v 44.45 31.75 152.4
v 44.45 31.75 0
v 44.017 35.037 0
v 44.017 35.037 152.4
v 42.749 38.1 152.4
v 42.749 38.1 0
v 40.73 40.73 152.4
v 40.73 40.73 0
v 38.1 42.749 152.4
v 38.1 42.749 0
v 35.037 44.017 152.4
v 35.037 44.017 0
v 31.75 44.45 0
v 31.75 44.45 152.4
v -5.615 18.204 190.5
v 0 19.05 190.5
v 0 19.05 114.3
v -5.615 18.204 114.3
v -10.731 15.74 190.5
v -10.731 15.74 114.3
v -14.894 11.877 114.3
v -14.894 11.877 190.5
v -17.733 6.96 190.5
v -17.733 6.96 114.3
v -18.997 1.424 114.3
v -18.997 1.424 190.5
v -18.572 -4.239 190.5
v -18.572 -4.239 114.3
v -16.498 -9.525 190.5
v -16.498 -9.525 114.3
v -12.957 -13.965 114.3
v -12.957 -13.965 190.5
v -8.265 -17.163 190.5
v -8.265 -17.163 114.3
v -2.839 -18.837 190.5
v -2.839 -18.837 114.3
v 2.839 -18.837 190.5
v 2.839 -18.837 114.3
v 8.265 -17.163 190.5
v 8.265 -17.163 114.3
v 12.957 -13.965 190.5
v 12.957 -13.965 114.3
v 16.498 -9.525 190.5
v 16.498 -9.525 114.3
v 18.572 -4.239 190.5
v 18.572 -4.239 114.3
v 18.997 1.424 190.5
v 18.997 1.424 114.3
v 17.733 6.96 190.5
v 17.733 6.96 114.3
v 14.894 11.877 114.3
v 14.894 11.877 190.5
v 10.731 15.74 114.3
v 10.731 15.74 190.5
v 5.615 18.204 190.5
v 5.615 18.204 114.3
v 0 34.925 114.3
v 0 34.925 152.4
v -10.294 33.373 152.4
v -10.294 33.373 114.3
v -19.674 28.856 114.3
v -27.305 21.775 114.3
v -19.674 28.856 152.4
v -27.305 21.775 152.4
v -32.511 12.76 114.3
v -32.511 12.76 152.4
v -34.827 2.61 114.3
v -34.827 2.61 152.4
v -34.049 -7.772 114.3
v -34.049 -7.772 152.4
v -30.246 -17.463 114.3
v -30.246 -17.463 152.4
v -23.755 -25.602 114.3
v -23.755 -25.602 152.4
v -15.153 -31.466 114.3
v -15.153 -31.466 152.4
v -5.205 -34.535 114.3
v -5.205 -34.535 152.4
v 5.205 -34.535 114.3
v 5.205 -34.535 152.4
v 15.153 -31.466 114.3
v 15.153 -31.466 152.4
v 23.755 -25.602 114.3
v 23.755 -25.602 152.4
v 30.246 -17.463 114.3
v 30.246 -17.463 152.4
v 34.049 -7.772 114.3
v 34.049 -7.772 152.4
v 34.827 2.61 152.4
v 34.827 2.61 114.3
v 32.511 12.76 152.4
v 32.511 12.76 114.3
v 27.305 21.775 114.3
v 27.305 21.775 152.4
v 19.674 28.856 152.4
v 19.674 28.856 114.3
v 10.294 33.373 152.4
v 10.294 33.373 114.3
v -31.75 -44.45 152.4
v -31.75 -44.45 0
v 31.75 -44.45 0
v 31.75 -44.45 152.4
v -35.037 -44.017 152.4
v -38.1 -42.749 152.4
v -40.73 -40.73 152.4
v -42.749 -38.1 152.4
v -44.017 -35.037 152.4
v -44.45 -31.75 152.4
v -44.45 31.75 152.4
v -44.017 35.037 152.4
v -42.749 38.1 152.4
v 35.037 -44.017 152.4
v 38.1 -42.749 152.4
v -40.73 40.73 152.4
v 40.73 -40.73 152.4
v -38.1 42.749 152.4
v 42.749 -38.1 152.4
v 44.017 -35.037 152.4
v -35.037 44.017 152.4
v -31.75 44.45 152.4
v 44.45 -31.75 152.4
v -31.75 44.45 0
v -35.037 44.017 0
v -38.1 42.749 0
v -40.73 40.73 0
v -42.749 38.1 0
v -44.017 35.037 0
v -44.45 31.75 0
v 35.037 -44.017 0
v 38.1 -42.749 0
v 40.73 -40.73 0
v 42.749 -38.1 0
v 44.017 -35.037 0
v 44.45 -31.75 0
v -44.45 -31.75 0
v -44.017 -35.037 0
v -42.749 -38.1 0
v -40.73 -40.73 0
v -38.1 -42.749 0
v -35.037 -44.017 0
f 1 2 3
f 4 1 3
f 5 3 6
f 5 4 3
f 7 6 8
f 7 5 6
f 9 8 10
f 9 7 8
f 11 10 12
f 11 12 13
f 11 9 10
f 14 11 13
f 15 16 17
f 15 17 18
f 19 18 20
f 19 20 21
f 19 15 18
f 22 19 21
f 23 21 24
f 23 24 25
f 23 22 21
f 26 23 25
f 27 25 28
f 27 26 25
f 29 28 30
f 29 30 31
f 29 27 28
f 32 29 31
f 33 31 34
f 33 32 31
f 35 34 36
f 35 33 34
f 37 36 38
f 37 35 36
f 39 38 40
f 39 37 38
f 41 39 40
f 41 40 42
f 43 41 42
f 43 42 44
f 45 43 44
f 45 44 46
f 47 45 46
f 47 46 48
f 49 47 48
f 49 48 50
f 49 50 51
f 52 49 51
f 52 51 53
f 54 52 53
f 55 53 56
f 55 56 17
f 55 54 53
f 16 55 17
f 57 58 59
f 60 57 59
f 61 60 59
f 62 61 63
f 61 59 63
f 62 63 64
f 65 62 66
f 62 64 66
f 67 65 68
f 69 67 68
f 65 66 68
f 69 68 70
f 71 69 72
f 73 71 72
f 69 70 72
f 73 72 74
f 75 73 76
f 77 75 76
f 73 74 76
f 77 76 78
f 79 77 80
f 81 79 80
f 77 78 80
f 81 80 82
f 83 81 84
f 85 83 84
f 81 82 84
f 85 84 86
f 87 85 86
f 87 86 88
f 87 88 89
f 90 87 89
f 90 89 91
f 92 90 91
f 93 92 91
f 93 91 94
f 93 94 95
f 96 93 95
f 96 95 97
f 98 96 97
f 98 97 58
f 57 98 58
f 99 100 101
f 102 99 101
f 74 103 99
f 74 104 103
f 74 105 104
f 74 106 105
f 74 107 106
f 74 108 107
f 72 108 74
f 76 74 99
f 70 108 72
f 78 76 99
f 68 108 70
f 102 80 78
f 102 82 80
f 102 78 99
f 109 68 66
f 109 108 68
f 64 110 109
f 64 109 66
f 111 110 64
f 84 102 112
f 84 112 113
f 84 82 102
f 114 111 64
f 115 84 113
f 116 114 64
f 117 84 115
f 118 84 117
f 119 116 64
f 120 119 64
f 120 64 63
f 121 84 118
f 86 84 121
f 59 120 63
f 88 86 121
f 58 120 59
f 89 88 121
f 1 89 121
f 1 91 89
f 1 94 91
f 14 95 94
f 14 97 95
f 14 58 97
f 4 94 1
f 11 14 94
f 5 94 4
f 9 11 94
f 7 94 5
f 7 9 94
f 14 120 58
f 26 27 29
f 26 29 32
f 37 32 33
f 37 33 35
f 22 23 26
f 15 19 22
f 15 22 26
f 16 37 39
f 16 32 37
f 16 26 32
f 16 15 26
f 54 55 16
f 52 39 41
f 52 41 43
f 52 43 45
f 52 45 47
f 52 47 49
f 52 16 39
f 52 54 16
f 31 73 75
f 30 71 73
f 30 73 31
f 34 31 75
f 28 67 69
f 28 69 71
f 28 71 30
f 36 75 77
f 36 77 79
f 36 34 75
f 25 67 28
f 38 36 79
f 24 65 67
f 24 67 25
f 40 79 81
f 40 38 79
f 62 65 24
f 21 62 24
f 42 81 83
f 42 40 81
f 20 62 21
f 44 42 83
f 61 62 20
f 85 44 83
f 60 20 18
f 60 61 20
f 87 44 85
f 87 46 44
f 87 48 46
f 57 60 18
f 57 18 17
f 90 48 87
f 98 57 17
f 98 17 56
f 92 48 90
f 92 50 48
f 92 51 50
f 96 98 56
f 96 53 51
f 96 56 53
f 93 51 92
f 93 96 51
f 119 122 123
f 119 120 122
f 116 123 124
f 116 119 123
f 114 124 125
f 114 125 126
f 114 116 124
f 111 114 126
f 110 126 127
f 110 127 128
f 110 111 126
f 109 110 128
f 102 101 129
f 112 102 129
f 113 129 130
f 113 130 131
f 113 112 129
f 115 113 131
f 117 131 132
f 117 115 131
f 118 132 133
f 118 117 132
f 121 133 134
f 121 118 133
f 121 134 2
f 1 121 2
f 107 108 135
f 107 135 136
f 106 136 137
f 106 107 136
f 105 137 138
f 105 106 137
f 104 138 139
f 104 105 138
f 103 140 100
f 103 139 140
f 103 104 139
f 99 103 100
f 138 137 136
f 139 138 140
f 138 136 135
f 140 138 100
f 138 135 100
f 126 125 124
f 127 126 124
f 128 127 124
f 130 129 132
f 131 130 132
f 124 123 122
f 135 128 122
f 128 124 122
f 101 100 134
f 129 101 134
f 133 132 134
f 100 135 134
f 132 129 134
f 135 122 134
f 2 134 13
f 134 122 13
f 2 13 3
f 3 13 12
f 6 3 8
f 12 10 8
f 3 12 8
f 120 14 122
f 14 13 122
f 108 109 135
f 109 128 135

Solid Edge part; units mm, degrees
sketch "Sketch1" plane through (0, 0, 0) normal (0, 0, 1) x (1, 0, 0)
  line L0 (-44.45, -44.45) -> (44.45, -44.45)
  line L1 (44.45, -44.45) -> (44.45, 44.45)
  line L2 (44.45, 44.45) -> (-44.45, 44.45)
  line L3 (-44.45, 44.45) -> (-44.45, -44.45)
extrude "Protrusion1" add sketch "Sketch1" along normal blind 152.4
fillet "Round_1" radius 12.7 4 edges at (44.45, -44.45, 76.2) (-44.45, -44.45, 76.2) (44.45, 44.45, 76.2) (-44.45, 44.45, 76.2)
sketch "Sketch2" plane through (0, 0, 152.4) normal (0, 0, 1) x (0, 1, 0)
  circle A0 centre (0, 0) radius 34.925
extrude "ExtrudedCutout_1" cut sketch "Sketch2" against normal blind 38.1
sketch "Sketch3" plane through (0, 0, 152.4) normal (0, 0, 1) x (0, 1, 0)
  circle A0 centre (0, 0) radius 19.05
extrude "Protrusion2" add sketch "Sketch3" against normal up to next
sketch "Sketch4" plane through (0, 0, 152.4) normal (0, 0, 1) x (0, 1, 0)
  circle A0 centre (0, 0) radius 19.05
extrude "ExtrudedProtrusion_3" add sketch "Sketch4" along normal blind 38.1
